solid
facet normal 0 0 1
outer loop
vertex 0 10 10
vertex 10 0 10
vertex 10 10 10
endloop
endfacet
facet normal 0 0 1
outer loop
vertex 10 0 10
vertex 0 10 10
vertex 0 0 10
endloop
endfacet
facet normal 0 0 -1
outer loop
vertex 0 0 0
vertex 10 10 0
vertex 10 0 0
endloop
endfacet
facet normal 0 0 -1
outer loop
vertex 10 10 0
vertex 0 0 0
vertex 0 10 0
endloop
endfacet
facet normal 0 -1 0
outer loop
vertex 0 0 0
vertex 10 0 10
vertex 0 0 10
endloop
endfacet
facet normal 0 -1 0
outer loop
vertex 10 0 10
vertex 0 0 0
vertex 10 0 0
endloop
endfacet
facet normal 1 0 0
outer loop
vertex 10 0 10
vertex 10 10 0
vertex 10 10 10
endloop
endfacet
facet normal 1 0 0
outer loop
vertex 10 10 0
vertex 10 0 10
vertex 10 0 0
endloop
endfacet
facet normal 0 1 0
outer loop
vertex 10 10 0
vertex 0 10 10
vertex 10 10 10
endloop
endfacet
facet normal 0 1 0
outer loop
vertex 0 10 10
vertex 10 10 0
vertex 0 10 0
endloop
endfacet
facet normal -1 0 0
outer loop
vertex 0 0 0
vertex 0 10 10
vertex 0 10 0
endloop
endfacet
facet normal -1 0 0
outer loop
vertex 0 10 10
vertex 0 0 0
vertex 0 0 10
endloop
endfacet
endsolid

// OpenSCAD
// file: ../lib/demo-cube-lib.scad
// Minimal model for the Astro integration test. Kept trivial so `astro build`
// in CI spends its time on the integration, not on CSG.

// BEGIN_PARAMS

// Edge length (mm).
size = 10;

// Bevel the top edge.
beveled = false;

// END_PARAMS

module demo_cube() {
  if (beveled) {
    hull() {
      cube([size, size, size * 0.6]);
      translate([1, 1, 0]) cube([size - 2, size - 2, size]);
    }
  } else {
    cube([size, size, size]);
  }
}

// Declared in the manifest but never placed on a page, so the test can tell
// `prerender: 'referenced'` apart from `prerender: 'declared'`.
module demo_lid() {
  cube([size, size, 2]);
}
// main file
include <../lib/demo-cube-lib.scad>;
$fn = 16;
demo_cube();
